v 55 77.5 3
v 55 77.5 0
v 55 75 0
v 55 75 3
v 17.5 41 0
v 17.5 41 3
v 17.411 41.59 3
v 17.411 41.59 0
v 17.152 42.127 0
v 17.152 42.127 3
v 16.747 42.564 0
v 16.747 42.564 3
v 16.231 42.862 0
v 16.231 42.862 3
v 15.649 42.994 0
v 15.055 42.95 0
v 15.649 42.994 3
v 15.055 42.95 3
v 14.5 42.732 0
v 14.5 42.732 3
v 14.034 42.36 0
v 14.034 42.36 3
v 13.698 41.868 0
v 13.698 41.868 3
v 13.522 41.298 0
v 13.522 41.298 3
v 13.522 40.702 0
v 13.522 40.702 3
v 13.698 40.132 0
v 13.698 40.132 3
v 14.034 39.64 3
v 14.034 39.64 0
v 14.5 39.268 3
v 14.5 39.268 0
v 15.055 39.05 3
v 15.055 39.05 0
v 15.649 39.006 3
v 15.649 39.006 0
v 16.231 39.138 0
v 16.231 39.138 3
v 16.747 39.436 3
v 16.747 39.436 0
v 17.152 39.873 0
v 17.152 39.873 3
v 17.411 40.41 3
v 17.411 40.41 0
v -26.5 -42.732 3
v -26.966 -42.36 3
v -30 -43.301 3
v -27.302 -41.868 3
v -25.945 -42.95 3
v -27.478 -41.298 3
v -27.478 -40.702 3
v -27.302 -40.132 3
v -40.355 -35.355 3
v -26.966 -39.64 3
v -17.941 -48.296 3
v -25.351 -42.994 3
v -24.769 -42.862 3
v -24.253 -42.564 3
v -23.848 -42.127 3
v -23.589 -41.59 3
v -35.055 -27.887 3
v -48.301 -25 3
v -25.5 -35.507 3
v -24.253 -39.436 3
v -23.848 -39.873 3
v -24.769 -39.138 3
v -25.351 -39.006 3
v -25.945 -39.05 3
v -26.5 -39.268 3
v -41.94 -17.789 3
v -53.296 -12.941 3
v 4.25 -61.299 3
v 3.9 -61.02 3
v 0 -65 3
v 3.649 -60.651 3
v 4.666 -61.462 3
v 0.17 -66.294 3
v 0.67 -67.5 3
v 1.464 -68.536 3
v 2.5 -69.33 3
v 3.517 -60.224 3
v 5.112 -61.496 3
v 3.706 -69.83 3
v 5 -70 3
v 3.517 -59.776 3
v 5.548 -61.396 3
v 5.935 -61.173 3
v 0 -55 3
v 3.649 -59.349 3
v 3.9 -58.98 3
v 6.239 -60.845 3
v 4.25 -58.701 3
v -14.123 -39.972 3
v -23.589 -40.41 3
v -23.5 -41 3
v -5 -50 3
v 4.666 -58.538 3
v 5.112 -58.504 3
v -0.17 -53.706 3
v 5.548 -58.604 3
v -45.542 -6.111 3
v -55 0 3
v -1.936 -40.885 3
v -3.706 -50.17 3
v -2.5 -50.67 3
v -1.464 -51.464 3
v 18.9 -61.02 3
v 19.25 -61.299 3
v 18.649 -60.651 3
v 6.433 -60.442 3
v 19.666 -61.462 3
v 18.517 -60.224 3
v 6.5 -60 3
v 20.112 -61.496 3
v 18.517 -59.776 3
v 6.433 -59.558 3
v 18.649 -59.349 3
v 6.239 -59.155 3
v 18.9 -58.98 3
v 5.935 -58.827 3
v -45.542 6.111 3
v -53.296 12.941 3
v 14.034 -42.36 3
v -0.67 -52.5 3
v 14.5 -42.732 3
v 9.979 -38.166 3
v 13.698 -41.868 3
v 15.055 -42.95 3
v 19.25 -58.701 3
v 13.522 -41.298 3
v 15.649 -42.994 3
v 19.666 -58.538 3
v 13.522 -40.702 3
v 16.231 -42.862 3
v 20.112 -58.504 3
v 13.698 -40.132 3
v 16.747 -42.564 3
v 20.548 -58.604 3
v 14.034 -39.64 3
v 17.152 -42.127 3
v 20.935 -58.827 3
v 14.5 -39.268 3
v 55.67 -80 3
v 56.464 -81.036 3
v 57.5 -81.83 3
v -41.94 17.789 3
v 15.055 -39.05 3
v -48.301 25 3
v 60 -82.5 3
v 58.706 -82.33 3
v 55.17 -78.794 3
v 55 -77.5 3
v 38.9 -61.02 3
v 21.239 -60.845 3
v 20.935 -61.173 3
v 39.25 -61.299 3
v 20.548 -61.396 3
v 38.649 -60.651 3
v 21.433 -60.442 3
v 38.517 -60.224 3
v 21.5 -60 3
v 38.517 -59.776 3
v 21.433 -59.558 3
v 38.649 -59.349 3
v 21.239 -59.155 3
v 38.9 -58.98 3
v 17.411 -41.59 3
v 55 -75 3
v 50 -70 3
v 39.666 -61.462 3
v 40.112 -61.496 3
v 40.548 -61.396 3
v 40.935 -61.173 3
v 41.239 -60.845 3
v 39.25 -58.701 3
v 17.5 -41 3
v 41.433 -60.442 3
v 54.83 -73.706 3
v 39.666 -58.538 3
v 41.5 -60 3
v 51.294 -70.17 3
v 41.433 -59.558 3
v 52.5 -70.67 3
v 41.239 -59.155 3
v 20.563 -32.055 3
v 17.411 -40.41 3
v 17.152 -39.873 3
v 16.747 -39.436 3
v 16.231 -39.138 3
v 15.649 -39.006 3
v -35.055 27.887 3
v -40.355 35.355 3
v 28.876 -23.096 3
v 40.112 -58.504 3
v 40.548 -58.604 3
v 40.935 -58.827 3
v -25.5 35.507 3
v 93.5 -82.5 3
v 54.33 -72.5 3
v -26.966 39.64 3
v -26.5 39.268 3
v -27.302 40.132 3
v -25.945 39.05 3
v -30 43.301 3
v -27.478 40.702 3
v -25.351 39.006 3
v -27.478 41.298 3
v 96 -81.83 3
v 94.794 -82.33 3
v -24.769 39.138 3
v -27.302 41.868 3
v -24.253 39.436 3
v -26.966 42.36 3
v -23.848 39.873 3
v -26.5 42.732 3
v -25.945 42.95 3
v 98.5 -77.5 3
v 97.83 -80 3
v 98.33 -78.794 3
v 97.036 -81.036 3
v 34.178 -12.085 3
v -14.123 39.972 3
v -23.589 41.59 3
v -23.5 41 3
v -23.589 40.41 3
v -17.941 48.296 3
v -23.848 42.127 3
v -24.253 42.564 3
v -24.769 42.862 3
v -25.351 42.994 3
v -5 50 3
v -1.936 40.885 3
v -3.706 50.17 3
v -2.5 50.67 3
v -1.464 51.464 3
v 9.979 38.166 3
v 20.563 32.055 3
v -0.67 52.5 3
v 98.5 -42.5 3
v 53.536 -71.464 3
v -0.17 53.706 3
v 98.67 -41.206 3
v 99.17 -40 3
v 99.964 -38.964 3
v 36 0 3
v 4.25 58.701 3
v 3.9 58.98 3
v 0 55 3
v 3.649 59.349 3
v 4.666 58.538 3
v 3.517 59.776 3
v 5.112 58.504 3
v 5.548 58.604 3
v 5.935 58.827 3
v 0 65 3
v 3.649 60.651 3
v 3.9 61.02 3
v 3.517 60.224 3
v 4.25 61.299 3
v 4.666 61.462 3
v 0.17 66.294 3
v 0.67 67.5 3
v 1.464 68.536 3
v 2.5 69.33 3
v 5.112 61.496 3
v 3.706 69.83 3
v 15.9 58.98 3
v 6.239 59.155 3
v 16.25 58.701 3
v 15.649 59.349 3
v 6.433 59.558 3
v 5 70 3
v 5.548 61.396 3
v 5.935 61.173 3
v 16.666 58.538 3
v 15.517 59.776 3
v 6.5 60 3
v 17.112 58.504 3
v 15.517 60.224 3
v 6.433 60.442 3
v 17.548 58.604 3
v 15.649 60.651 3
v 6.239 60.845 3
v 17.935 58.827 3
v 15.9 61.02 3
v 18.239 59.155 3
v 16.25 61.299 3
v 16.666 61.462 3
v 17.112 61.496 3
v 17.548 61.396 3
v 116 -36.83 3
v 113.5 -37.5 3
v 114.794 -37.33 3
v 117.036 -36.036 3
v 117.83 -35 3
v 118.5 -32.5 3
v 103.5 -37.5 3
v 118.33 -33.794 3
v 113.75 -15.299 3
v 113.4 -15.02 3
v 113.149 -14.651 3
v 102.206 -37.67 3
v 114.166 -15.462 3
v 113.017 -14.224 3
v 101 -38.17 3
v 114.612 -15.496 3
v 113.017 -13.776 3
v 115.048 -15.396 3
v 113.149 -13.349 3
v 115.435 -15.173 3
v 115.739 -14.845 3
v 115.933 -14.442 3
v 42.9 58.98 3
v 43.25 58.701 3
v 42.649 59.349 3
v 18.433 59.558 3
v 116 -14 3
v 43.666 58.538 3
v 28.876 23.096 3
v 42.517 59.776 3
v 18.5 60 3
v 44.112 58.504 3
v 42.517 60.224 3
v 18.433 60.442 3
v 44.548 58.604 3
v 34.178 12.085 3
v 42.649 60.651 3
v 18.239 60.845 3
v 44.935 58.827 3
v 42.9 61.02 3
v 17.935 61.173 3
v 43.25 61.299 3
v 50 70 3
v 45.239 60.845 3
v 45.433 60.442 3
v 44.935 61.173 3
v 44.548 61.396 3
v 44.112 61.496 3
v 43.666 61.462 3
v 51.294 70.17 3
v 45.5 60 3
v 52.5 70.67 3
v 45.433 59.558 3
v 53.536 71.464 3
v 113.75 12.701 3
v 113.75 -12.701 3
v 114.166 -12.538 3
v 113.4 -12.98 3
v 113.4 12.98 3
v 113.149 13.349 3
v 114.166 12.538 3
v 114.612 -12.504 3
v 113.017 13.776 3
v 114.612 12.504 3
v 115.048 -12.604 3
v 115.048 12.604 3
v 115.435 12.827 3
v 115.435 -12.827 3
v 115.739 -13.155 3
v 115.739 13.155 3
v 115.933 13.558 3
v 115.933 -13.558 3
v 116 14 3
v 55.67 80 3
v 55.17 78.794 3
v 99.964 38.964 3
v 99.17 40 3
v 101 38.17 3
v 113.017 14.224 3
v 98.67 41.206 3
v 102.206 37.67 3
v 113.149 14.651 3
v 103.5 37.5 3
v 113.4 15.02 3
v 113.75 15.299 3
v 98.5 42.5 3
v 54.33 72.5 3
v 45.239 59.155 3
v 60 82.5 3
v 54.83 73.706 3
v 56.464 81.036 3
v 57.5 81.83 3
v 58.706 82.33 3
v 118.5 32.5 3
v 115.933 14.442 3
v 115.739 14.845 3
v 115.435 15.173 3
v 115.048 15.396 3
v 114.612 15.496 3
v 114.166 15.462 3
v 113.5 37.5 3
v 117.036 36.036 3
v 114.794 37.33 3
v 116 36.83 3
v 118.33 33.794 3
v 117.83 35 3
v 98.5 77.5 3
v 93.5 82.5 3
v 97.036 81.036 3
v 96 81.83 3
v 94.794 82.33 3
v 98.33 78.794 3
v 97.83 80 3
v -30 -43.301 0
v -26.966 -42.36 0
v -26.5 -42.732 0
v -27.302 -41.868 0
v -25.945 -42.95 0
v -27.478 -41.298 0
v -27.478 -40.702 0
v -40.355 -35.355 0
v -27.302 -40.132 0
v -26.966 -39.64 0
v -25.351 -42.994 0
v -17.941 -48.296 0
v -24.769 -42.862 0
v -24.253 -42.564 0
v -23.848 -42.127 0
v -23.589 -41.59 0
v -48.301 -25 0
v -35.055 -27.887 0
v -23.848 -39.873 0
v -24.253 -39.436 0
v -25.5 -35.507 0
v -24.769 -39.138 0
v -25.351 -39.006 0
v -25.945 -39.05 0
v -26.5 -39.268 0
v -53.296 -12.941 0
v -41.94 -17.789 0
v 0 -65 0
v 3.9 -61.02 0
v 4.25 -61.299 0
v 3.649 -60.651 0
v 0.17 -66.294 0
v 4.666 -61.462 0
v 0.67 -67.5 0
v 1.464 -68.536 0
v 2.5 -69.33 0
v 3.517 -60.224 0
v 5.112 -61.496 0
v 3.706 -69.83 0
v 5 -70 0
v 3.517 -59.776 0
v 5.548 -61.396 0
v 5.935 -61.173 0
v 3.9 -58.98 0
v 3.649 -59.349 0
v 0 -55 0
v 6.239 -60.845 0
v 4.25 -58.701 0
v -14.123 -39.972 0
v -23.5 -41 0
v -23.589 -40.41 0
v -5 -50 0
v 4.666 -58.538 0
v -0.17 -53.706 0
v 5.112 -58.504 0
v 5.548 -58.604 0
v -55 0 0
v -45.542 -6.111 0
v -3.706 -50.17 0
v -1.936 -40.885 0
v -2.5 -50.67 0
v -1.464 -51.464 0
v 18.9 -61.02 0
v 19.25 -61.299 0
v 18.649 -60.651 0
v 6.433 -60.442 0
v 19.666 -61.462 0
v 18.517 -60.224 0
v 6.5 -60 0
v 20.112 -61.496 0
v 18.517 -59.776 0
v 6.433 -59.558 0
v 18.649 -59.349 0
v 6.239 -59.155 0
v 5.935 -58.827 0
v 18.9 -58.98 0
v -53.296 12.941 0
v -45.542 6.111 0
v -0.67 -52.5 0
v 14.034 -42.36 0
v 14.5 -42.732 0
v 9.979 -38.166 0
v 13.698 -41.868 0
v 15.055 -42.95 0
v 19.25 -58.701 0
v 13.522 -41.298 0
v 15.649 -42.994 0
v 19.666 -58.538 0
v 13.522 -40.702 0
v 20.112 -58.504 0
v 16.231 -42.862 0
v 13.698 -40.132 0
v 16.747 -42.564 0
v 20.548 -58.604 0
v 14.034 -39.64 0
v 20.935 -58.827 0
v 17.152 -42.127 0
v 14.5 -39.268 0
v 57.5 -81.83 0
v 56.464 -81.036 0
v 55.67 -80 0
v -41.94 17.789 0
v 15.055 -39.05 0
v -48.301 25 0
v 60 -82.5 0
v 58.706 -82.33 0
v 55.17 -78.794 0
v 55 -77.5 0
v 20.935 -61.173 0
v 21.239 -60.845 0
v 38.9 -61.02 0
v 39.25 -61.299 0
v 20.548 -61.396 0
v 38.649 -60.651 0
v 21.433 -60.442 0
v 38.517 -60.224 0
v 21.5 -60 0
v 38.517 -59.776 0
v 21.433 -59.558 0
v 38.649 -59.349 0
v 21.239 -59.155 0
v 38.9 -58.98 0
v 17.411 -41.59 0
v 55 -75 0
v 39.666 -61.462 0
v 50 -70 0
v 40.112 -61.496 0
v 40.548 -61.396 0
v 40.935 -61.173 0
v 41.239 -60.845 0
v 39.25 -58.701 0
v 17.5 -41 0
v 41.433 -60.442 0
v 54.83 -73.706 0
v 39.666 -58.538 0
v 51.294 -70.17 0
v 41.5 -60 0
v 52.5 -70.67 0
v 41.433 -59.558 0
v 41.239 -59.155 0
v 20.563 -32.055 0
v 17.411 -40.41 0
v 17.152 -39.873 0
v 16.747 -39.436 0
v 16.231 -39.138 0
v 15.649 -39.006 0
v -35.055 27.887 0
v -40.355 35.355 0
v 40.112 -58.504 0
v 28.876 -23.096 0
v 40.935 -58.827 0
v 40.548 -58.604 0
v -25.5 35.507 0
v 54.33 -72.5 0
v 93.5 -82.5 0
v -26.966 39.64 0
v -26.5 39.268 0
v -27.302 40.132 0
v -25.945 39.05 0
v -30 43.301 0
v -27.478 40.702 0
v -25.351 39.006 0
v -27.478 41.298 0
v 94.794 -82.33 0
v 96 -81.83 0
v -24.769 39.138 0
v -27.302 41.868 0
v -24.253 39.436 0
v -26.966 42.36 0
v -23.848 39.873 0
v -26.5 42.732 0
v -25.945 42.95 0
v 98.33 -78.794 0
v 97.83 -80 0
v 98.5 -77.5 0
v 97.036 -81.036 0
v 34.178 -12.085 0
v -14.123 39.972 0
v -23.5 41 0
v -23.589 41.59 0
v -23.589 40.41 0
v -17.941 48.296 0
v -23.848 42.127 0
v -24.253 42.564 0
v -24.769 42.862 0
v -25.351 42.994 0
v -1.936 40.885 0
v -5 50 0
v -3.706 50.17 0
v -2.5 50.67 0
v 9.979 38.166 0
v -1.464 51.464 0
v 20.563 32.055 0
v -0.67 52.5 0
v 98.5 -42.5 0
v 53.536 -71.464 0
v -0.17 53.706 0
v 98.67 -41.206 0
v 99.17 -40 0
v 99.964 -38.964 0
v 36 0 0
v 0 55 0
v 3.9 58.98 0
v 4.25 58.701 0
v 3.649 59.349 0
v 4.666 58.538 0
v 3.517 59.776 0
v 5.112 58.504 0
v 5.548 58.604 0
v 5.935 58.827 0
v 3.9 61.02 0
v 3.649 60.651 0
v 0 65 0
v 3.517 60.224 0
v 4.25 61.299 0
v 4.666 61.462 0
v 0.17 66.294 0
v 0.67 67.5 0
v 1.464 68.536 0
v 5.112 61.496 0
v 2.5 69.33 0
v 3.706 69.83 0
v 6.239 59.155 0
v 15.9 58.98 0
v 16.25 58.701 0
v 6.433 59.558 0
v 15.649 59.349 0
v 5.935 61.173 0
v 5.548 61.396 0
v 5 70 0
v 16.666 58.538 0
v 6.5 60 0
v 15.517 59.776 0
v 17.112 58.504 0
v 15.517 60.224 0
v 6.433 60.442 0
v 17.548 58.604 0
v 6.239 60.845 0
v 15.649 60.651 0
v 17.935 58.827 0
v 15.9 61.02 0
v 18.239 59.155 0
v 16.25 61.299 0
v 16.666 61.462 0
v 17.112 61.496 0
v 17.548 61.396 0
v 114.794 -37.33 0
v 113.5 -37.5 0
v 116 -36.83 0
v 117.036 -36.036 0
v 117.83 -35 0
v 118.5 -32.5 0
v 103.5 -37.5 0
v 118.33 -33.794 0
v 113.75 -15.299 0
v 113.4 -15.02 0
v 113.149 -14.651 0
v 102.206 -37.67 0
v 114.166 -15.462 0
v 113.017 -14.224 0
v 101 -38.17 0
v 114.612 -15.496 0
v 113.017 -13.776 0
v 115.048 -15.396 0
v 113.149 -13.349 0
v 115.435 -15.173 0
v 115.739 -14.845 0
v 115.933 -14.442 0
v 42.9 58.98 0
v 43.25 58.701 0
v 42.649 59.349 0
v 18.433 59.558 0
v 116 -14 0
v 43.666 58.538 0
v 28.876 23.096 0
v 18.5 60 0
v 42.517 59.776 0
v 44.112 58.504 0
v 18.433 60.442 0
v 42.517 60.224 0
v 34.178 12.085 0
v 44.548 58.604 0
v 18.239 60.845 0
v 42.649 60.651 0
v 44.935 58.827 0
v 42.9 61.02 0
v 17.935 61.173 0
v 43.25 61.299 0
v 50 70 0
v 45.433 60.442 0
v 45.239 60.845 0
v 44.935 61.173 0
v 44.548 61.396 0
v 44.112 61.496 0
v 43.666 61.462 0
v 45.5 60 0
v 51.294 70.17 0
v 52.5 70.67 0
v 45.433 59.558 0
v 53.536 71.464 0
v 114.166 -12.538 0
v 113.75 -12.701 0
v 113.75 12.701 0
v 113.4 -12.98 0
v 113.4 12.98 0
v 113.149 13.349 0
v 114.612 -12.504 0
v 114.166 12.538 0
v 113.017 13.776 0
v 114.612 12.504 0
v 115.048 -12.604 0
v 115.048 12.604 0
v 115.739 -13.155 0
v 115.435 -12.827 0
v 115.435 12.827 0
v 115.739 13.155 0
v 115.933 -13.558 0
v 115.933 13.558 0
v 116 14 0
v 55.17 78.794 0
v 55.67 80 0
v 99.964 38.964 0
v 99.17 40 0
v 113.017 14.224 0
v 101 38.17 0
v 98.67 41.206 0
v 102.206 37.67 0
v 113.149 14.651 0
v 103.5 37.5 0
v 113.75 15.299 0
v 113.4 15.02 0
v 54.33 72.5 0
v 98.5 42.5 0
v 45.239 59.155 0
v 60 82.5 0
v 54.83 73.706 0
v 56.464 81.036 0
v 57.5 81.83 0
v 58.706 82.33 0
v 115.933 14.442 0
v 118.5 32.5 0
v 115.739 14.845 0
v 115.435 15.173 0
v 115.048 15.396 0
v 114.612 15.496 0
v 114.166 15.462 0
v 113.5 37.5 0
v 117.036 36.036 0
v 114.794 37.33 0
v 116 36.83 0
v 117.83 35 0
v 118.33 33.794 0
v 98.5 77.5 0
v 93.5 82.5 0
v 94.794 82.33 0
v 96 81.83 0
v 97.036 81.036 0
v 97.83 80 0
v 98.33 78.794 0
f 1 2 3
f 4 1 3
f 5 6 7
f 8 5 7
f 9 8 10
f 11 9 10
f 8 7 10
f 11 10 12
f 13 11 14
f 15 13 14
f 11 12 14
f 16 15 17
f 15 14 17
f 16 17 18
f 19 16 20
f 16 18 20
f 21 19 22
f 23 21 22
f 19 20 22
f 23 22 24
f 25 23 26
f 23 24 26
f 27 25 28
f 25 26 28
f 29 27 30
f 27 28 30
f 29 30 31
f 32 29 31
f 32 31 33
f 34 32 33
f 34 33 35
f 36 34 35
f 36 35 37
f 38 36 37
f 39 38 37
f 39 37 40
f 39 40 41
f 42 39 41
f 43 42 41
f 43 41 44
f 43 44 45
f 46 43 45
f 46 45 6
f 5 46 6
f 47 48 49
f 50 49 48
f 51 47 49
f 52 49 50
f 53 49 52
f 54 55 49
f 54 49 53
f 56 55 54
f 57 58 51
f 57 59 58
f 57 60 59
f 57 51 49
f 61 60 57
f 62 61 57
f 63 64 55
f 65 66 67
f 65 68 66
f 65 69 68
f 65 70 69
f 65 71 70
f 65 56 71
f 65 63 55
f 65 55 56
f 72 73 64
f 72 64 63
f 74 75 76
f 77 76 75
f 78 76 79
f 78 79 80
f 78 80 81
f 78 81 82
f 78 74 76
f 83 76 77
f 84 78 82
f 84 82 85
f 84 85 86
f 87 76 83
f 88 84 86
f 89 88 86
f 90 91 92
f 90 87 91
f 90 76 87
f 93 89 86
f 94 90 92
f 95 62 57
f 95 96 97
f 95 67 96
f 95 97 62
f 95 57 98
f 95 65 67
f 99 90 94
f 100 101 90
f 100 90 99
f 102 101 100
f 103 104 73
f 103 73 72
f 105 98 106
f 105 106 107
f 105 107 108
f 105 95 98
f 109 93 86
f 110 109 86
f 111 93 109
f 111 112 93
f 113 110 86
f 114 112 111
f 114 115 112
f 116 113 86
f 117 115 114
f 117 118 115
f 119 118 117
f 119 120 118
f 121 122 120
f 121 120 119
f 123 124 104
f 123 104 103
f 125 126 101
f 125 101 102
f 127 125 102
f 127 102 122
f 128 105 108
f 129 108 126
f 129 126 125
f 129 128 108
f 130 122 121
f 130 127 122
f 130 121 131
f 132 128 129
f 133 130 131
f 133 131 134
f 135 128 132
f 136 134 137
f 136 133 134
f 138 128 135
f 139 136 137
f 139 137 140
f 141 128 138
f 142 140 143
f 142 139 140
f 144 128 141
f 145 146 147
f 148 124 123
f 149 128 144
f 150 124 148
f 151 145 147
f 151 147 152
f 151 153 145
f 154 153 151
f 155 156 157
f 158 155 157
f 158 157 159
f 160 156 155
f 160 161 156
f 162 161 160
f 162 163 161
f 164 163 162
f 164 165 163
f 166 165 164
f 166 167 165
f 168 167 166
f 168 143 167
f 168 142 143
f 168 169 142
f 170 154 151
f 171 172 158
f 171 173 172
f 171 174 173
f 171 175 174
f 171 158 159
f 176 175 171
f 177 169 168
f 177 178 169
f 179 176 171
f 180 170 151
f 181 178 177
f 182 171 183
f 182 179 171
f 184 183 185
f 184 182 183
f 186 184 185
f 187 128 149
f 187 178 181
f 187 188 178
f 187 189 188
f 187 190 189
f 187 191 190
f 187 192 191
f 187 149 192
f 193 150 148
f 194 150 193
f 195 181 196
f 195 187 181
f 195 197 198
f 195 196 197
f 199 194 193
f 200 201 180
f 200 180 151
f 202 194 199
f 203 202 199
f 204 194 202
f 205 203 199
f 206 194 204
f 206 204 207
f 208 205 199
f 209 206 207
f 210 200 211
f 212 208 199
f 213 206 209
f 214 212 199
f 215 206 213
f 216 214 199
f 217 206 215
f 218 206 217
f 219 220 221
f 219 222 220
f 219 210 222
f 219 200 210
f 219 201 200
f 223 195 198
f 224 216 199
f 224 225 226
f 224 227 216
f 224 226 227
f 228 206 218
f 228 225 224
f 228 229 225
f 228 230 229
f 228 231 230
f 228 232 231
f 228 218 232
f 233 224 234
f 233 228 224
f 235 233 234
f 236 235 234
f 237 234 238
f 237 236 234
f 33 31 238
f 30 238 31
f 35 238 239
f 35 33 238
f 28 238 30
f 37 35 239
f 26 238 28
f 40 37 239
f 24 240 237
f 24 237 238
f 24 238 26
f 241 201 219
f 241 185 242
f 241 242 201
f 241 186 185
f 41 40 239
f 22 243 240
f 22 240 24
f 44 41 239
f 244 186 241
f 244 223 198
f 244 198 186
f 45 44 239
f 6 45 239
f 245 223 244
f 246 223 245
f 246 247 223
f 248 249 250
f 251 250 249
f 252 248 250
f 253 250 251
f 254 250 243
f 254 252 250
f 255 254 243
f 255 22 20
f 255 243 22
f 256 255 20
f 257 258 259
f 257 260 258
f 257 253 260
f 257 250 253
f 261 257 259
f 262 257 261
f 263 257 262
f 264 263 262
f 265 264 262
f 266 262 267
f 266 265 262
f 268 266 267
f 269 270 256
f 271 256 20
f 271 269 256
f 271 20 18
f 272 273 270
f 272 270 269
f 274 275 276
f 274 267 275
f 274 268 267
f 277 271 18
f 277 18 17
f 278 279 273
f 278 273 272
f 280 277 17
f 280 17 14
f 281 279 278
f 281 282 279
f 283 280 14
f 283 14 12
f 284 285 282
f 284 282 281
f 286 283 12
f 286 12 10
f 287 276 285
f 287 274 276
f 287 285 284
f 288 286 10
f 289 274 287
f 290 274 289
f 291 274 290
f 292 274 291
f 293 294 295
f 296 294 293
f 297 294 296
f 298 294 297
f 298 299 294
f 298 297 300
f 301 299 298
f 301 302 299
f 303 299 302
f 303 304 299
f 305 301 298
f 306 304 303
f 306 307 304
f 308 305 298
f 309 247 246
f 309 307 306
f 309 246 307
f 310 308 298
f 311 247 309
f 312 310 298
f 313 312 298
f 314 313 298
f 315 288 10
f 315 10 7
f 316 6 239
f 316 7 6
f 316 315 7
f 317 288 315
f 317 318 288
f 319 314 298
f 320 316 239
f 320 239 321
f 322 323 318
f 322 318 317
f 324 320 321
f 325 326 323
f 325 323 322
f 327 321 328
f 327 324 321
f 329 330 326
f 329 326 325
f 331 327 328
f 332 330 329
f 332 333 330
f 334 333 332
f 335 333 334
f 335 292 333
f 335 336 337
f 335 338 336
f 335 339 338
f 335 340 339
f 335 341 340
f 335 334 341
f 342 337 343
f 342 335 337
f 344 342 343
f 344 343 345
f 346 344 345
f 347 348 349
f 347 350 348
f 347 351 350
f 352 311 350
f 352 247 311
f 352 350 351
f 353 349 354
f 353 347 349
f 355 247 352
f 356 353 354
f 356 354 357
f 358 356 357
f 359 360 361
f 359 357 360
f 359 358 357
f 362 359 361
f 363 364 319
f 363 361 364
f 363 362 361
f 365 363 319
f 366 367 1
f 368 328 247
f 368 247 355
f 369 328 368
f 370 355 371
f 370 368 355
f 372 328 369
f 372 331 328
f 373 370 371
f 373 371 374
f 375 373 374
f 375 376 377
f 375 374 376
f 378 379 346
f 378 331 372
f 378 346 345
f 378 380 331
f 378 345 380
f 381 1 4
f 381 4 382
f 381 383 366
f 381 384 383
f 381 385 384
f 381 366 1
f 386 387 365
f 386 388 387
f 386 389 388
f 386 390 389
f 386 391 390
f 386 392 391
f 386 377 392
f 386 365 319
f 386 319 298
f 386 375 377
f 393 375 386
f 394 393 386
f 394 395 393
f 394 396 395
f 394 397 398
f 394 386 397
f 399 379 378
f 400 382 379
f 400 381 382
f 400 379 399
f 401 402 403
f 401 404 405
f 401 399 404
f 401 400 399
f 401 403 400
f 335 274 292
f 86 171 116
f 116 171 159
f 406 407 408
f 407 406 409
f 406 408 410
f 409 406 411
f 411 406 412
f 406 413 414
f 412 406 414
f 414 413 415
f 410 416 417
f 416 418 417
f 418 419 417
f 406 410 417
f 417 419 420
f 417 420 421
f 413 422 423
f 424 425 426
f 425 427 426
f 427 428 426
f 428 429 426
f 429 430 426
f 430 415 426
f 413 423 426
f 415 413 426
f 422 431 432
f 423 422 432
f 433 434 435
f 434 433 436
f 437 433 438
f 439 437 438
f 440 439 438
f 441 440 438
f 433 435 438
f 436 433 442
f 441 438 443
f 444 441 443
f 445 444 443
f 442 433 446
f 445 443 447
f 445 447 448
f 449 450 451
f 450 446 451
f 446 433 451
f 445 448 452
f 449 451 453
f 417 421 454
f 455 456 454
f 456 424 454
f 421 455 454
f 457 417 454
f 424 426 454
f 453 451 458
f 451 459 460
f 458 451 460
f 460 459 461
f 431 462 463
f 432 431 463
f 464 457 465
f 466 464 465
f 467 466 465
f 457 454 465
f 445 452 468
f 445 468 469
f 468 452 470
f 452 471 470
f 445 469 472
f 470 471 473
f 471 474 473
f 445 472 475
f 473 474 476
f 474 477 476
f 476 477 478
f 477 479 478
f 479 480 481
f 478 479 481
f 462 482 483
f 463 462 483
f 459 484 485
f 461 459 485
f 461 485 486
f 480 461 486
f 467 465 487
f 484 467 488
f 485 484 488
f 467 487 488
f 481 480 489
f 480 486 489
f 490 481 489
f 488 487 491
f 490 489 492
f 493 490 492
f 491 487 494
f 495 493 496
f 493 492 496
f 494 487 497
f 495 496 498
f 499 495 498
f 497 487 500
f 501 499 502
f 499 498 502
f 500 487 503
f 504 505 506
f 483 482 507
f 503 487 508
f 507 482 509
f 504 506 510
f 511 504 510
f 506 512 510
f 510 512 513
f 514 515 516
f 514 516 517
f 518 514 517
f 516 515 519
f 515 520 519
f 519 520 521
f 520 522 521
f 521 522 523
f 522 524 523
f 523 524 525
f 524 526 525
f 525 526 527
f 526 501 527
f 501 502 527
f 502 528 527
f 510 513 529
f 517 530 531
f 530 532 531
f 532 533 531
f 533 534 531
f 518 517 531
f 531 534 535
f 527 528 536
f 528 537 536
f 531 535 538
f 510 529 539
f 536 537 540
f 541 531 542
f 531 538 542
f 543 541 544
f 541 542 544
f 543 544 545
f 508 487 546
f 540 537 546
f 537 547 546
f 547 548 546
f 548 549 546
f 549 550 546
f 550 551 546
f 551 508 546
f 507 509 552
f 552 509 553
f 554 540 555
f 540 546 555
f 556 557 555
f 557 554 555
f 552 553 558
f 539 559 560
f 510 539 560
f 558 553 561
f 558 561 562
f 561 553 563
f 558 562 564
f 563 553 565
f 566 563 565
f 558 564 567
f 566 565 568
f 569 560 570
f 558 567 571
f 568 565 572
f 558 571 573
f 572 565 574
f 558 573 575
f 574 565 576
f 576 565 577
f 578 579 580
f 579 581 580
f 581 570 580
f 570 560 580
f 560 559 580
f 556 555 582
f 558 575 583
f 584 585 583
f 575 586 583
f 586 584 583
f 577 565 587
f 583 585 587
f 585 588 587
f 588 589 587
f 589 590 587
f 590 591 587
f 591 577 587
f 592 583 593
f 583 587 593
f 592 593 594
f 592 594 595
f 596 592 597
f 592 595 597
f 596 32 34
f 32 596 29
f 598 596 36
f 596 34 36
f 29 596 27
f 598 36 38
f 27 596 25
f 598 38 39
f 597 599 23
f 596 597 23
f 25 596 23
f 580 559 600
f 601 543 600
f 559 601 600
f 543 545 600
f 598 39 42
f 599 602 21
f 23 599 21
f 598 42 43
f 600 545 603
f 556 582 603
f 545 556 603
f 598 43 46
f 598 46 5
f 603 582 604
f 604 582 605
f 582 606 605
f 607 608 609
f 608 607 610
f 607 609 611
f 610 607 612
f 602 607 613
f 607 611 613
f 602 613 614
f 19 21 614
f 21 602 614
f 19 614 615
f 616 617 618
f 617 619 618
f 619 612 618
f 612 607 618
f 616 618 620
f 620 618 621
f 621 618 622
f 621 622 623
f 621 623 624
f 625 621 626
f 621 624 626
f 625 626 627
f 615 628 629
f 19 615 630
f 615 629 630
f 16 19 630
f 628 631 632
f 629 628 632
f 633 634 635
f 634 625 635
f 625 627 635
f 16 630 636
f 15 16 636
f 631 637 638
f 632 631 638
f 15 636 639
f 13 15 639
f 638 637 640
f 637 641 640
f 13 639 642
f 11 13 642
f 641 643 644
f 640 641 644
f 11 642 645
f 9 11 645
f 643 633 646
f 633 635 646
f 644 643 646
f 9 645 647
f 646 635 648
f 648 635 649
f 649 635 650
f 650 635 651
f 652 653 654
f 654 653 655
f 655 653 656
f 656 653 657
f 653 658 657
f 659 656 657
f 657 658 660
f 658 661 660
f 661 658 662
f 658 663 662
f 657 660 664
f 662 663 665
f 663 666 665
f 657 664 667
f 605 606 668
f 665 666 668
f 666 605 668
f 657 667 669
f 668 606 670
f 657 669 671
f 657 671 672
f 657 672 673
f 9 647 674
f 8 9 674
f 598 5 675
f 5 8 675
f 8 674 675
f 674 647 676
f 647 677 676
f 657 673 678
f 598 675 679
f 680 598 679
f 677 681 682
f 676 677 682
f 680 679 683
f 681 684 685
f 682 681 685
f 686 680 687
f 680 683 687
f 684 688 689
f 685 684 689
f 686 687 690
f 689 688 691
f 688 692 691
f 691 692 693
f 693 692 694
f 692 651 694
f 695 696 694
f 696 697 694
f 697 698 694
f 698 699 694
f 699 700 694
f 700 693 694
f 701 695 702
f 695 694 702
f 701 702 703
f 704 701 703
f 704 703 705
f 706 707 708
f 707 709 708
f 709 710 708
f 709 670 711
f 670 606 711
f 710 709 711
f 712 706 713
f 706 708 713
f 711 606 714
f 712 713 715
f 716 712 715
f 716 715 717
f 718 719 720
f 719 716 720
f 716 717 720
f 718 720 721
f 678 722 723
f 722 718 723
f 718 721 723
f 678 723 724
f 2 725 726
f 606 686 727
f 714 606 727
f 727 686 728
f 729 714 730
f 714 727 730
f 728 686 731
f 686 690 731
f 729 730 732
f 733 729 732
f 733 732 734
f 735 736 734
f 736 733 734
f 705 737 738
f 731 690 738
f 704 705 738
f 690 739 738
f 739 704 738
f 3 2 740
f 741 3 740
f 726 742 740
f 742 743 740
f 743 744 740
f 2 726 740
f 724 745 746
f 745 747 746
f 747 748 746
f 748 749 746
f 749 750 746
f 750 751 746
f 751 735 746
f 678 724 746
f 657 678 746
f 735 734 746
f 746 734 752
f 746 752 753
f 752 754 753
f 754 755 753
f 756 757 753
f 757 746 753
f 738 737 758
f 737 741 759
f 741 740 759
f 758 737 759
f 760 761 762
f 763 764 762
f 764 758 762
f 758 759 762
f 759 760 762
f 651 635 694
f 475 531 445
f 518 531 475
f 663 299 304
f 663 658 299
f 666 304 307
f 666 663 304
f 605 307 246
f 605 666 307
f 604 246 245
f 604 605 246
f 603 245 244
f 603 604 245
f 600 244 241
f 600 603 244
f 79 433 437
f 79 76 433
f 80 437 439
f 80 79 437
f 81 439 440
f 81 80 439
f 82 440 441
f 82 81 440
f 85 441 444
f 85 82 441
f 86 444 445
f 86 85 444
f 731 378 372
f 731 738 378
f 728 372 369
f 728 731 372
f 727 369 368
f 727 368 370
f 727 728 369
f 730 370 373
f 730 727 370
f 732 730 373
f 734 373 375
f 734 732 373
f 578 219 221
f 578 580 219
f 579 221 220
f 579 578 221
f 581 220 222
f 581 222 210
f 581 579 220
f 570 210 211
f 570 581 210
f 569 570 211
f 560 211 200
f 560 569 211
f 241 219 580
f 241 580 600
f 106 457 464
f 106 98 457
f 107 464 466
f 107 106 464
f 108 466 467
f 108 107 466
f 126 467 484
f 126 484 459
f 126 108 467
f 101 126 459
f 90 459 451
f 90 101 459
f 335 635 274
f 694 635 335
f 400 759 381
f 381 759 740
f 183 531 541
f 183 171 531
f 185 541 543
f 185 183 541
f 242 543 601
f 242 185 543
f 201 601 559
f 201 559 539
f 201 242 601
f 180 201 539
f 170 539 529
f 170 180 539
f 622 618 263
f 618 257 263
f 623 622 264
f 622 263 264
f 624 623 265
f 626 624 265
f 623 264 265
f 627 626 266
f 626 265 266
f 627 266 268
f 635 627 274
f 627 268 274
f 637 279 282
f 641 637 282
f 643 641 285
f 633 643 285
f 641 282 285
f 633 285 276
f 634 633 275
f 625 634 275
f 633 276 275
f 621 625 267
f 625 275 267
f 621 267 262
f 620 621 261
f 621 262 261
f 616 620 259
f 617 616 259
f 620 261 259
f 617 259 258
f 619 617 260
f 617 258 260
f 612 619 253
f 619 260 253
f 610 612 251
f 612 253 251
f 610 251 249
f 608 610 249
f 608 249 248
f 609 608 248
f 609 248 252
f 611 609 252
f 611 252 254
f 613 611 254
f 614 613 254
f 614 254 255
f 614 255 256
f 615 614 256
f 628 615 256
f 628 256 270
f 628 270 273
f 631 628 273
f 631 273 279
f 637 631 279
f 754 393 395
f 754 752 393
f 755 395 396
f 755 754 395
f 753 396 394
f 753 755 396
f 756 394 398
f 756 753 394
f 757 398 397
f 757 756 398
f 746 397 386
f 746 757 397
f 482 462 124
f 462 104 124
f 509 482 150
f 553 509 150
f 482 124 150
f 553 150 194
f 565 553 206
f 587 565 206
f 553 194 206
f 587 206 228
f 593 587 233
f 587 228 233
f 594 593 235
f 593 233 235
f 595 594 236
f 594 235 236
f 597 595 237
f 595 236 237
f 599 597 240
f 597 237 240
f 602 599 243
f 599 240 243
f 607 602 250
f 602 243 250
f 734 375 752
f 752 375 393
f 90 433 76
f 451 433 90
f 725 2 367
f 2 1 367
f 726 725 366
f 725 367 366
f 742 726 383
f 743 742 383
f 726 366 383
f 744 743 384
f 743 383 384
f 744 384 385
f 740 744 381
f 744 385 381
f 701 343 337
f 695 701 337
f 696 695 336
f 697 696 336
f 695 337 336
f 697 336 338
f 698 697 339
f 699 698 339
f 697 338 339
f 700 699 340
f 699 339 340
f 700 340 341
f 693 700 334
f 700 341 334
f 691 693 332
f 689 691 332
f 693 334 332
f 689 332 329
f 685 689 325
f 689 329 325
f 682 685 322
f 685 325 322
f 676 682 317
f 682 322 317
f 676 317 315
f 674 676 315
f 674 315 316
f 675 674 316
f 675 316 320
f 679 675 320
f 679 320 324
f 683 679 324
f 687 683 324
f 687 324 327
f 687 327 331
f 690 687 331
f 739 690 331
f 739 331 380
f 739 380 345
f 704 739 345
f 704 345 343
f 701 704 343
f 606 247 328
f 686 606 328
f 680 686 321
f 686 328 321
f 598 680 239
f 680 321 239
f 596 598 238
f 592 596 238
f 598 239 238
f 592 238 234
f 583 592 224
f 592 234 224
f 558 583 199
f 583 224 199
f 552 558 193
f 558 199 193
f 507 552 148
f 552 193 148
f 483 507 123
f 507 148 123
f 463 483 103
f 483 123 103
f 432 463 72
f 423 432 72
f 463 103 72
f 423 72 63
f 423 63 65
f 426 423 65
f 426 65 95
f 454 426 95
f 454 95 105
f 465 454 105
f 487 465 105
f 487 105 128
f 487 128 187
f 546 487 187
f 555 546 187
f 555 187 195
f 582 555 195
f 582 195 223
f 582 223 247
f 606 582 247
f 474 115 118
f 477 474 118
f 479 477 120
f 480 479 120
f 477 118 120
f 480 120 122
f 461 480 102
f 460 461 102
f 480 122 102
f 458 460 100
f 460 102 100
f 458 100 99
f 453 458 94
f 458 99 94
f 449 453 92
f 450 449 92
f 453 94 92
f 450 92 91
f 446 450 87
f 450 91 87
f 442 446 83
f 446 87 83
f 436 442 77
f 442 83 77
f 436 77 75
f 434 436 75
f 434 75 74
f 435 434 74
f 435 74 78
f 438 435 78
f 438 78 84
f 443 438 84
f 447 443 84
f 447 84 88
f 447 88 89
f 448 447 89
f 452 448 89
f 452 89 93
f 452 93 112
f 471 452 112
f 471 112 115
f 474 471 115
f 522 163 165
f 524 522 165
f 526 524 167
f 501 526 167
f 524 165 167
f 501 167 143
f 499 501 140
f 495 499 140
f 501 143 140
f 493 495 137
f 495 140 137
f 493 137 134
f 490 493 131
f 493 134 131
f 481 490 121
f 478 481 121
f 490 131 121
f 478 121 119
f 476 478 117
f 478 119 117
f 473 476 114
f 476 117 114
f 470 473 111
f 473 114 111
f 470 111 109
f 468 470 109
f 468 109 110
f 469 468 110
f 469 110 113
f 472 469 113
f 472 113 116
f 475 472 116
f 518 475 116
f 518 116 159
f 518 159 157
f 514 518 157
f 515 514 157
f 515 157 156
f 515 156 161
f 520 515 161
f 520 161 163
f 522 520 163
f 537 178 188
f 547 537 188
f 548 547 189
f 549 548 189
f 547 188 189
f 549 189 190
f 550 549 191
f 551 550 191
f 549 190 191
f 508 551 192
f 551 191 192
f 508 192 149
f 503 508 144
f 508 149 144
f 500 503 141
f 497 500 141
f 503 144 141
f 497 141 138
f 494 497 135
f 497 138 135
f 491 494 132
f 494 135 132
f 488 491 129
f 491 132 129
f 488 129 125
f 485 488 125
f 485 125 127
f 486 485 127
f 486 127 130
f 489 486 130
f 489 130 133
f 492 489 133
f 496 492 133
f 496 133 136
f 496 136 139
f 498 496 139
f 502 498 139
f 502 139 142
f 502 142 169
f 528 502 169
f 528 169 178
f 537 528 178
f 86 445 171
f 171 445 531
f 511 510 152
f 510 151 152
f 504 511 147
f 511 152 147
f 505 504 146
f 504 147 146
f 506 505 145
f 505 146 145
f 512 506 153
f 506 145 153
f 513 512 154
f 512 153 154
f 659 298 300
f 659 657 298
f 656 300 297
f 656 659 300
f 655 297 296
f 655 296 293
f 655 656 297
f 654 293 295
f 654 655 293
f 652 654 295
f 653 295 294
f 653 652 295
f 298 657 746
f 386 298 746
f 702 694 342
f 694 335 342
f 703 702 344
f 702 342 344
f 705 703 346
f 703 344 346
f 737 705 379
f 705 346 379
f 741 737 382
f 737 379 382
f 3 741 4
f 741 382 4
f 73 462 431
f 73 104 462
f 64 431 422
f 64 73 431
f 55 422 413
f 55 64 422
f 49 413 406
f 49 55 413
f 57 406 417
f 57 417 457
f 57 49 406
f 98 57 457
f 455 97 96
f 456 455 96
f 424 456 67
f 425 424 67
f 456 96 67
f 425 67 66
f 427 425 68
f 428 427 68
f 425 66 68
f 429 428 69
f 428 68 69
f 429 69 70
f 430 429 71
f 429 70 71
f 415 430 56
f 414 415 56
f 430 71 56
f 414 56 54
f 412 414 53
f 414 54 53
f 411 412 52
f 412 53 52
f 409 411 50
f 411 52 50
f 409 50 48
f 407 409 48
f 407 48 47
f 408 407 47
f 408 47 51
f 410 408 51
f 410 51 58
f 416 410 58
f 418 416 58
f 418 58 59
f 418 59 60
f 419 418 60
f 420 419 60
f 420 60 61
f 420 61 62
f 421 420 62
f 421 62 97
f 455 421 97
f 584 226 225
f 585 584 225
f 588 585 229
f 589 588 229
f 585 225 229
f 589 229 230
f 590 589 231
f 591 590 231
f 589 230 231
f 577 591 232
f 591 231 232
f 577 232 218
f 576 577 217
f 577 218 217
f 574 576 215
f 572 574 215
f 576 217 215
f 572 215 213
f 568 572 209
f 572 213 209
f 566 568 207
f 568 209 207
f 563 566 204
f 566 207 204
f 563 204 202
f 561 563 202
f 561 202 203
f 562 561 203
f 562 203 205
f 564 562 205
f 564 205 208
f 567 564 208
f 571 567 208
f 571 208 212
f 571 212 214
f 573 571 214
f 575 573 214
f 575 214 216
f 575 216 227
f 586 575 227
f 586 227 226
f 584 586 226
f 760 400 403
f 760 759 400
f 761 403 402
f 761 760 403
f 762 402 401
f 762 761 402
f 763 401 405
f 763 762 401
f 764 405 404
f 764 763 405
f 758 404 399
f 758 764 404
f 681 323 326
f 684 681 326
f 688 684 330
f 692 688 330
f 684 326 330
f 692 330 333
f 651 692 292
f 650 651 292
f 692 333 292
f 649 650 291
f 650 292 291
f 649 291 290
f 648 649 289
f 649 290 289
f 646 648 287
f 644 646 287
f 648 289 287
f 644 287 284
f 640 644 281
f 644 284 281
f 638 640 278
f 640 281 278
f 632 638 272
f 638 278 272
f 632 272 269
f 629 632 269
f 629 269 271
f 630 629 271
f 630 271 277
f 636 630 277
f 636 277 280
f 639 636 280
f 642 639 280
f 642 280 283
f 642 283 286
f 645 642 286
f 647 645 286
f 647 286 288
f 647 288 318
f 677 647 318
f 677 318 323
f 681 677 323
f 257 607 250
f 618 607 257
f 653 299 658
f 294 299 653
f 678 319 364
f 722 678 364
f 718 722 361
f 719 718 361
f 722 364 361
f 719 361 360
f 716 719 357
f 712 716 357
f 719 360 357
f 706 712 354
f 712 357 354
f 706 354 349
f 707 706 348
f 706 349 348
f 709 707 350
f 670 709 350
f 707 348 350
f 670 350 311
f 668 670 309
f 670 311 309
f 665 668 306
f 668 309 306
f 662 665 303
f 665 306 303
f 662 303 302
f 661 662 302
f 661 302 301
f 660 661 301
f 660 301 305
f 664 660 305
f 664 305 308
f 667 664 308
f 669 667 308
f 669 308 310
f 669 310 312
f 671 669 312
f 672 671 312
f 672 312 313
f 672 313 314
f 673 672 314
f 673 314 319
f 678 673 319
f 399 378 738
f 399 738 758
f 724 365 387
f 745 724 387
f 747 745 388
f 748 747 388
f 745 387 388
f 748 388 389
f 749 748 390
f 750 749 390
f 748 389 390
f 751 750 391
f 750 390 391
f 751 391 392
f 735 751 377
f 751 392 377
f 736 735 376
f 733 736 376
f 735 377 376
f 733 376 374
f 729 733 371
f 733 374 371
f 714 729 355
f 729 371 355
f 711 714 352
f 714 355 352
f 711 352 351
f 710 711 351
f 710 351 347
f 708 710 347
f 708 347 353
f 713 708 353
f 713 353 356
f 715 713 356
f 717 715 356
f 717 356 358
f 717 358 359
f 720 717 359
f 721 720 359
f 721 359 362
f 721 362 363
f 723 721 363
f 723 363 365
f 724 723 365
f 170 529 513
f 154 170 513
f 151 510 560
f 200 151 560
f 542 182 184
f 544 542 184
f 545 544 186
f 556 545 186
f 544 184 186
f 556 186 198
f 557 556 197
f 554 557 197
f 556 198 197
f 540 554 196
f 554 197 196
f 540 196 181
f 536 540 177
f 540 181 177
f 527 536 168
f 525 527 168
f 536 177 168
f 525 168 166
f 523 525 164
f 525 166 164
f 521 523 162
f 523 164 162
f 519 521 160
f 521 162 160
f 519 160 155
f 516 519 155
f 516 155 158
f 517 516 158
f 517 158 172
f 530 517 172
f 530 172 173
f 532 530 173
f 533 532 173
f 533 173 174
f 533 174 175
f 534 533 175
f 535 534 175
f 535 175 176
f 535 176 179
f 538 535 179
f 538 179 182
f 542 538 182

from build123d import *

# Parameters (mm, degrees)
SKETCH_1_W          = 110
SKETCH_1_H          = 100
SKETCH_1_W_2        = 55
SKETCH_1_H_2        = 20
EXTRUDE_1_DEPTH     = 3
FILLET_1_R          = 50
SKETCH_2_R          = 41
CUT_EXTRUDE_1_DEPTH = 10
FILLET_4_R          = 5
SKETCH_3_R          = 1.5
SKETCH_3_R_2        = 2
CUT_EXTRUDE_2_DEPTH = 10
SKETCH_4_W          = 20
SKETCH_4_H          = 45
CUT_EXTRUDE_3_DEPTH = 10
FILLET_5_R          = 5


with BuildPart() as part:
    # 草图1 → 凸台-拉伸1 (new body)
    with BuildSketch(Plane.XY):
        Rectangle(SKETCH_1_W, SKETCH_1_H)
        Polygon((55, 70), (55, 50), (55, -50), (55, -70), (55, -82.5), (118.5, -82.5), (118.5, 82.5), (55, 82.5), align=None)
        with Locations((27.5, 60)):
            Rectangle(SKETCH_1_W_2, SKETCH_1_H_2)
        with Locations((27.5, -60)):
            Rectangle(SKETCH_1_W_2, SKETCH_1_H_2)
    extrude(amount=EXTRUDE_1_DEPTH)

    # 圆角1
    fillet_1_edges = [part.edges().sort_by_distance(p)[0] for p in [
        (-55, -50, 1.5),
        (-55, 50, 1.5),
    ]]
    fillet(fillet_1_edges, radius=FILLET_1_R - 0.0001)  # a hair under: the kernel refuses the full size

    # 草图2 → 切除-拉伸1 (cut)
    with BuildSketch(Plane.XY.offset(3)):
        with Locations((-5, 0)):
            Circle(SKETCH_2_R)
    extrude(amount=-CUT_EXTRUDE_1_DEPTH, mode=Mode.SUBTRACT)

    # 圆角4
    fillet_4_edges = [part.edges().sort_by_distance(p)[0] for p in [
        (0, -70, 1.5),
        (0, -50, 1.5),
        (0, 50, 1.5),
        (0, 70, 1.5),
        (55, 70, 1.5),
        (55, -70, 1.5),
    ]]
    fillet(fillet_4_edges, radius=FILLET_4_R)

    # 草图3 → 切除-拉伸2 (cut)
    with BuildSketch(Plane.XY.offset(3)):
        with Locations((114.5, 14)):
            Circle(SKETCH_3_R)
        with Locations((114.5, -14)):
            Circle(SKETCH_3_R)
        with Locations((-25.5, 41)):
            Circle(SKETCH_3_R_2)
        with Locations((15.5, 41)):
            Circle(SKETCH_3_R_2)
        with Locations((15.5, -41)):
            Circle(SKETCH_3_R_2)
        with Locations((-25.5, -41)):
            Circle(SKETCH_3_R_2)
        with Locations((5, -60)):
            Circle(SKETCH_3_R)
        with Locations((20, -60)):
            Circle(SKETCH_3_R)
        with Locations((40, -60)):
            Circle(SKETCH_3_R)
        with Locations((5, 60)):
            Circle(SKETCH_3_R)
        with Locations((17, 60)):
            Circle(SKETCH_3_R)
        with Locations((44, 60)):
            Circle(SKETCH_3_R)
    extrude(amount=-CUT_EXTRUDE_2_DEPTH, mode=Mode.SUBTRACT)

    # 草图4 → 切除-拉伸3 (cut)
    with BuildSketch(Plane.XY.offset(3)):
        with Locations((108.5, 60)):
            Rectangle(SKETCH_4_W, SKETCH_4_H)
        with Locations((108.5, -60)):
            Rectangle(SKETCH_4_W, SKETCH_4_H)
    extrude(amount=-CUT_EXTRUDE_3_DEPTH, mode=Mode.SUBTRACT)

    # 圆角5
    fillet_5_edges = [part.edges().sort_by_distance(p)[0] for p in [
        (98.5, 82.5, 1.5),
        (118.5, 37.5, 1.5),
        (98.5, 37.5, 1.5),
        (98.5, -82.5, 1.5),
        (98.5, -37.5, 1.5),
        (118.5, -37.5, 1.5),
        (55, 82.5, 1.5),
        (55, -82.5, 1.5),
    ]]
    fillet(fillet_5_edges, radius=FILLET_5_R)


solid = part.part
